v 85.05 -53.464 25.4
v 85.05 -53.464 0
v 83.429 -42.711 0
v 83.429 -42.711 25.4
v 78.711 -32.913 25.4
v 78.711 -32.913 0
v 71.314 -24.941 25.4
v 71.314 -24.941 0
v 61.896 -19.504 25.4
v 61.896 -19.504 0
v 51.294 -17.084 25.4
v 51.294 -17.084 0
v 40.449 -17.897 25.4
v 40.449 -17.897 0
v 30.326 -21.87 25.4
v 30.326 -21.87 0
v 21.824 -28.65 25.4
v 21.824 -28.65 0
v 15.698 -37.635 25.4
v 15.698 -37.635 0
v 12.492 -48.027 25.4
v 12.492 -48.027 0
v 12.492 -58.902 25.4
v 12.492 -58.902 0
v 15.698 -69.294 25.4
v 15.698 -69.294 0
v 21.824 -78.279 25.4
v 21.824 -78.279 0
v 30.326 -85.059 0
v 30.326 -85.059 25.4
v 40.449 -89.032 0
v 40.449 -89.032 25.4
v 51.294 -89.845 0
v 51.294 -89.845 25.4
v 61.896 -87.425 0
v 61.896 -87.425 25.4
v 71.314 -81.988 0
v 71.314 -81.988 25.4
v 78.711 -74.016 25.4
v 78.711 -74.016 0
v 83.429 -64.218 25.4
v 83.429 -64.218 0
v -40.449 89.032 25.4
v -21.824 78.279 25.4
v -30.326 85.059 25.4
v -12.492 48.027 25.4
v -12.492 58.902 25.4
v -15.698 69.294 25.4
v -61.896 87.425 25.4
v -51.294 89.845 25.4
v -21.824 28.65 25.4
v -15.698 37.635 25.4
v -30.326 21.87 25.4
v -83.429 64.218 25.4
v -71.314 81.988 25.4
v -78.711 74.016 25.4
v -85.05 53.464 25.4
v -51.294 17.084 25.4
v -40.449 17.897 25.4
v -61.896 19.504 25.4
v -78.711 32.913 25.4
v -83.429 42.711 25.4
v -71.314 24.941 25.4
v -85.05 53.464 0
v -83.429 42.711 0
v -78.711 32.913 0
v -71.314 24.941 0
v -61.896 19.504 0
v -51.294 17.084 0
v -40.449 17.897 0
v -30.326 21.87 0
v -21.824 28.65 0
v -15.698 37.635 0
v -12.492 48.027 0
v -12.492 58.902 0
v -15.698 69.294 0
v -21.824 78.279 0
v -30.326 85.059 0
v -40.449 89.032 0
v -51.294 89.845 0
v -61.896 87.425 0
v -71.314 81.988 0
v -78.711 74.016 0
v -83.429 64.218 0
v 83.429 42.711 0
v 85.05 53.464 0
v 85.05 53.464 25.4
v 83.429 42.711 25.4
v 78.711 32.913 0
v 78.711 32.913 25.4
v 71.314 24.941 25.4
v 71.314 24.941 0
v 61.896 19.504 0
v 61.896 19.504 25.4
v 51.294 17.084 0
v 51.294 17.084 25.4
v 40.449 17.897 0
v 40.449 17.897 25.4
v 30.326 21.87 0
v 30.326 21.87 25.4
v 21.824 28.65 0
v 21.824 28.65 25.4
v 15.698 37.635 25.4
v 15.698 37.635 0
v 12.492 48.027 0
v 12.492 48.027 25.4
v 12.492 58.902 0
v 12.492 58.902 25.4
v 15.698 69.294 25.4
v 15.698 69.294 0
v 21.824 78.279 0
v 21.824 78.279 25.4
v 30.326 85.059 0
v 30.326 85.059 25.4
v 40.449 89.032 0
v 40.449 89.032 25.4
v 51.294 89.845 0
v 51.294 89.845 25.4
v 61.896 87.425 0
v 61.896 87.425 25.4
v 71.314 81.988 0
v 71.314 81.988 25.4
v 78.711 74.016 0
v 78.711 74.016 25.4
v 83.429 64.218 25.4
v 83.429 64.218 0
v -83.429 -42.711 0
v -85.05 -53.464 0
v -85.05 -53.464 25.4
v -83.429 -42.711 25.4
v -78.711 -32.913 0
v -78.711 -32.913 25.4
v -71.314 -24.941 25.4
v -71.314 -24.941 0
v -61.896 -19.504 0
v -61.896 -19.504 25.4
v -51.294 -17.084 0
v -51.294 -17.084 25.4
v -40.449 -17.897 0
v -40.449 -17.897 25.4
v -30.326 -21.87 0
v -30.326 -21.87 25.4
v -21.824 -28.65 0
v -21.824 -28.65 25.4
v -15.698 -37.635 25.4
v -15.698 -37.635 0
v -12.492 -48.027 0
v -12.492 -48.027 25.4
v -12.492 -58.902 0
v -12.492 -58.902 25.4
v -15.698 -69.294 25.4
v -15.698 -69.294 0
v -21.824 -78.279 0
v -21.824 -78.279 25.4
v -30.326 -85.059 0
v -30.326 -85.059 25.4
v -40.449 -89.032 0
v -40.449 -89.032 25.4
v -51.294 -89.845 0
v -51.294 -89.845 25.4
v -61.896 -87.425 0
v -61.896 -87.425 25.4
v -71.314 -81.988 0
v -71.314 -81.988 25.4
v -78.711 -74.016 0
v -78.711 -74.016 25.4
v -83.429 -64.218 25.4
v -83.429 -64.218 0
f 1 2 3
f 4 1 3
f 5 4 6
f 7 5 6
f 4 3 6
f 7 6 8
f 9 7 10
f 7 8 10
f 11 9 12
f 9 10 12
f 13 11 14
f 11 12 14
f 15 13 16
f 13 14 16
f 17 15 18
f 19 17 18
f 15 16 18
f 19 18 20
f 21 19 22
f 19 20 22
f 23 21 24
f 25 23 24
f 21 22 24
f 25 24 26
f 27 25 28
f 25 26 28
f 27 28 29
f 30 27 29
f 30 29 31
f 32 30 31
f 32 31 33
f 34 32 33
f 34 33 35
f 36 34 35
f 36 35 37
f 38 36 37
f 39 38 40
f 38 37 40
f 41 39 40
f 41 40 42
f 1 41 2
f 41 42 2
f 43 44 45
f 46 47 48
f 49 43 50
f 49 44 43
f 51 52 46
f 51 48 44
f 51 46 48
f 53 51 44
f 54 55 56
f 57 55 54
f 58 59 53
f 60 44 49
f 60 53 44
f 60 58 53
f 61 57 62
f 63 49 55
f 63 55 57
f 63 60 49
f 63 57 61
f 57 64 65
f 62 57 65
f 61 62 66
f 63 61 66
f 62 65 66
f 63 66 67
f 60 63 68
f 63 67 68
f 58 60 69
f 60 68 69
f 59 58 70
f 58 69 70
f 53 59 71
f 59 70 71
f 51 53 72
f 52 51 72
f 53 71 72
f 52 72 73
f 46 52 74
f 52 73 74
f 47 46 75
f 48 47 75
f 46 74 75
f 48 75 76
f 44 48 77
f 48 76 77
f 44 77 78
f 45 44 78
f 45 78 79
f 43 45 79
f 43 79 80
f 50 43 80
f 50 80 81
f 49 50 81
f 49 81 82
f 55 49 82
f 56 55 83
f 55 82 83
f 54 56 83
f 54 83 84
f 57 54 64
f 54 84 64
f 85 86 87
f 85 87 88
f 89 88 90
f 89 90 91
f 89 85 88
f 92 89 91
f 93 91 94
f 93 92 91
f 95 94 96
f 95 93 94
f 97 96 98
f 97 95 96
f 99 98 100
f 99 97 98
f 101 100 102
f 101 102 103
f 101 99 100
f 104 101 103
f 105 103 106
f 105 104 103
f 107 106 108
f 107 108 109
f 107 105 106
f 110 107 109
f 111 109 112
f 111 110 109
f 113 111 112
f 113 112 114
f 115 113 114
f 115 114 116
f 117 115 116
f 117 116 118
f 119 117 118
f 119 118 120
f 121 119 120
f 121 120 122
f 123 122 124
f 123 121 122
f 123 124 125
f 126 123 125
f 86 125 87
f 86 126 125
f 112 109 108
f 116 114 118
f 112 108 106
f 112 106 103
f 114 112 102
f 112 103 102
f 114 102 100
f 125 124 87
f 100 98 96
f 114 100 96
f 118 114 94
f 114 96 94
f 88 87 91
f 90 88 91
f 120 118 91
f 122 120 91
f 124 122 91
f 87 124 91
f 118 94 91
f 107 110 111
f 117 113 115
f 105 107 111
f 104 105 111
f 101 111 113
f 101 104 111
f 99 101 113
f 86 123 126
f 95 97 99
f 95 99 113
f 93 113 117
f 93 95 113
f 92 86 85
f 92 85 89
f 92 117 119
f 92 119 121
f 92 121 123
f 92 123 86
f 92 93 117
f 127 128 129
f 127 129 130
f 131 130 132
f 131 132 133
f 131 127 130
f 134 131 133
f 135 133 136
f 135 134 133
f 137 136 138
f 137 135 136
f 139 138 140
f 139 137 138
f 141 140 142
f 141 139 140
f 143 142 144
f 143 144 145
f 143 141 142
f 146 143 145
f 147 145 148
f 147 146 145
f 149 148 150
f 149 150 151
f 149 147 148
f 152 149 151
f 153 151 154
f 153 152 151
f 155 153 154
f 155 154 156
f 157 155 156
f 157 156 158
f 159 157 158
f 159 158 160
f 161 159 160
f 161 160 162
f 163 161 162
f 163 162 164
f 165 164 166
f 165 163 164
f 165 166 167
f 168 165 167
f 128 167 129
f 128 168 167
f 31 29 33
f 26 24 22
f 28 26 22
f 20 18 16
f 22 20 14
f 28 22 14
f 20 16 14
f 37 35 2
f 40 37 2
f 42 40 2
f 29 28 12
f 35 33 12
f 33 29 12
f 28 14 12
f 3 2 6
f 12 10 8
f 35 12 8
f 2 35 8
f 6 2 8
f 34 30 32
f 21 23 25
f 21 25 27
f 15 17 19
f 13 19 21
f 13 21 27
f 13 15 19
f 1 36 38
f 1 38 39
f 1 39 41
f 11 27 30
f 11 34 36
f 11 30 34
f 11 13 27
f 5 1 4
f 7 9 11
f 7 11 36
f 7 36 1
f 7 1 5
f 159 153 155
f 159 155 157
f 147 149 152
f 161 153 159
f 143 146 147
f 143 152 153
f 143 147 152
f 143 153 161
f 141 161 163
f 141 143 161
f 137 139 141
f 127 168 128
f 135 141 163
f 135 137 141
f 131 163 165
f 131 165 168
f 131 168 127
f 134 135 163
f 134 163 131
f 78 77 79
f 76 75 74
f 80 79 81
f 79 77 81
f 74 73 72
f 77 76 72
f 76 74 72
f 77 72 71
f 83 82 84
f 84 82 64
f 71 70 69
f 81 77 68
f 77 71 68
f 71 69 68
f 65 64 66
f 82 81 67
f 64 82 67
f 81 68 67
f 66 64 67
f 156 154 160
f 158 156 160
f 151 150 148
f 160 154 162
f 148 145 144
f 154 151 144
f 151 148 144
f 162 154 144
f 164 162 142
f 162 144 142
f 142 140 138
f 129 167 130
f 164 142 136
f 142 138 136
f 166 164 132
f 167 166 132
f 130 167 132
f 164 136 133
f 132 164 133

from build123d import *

# Parameters (mm, degrees)
F0_R     = 36.482578
F1_DEPTH = 25.4


with BuildPart() as f1:
    # F0 (on Top) → F1 (new body)
    with BuildSketch(Plane.XY):
        with Locations((48.56728, -53.464413)):
            Circle(F0_R)
    extrude(amount=F1_DEPTH)


with BuildPart() as f2_1:
    # F2: instance of F1
    add(f1.part.mirror(Plane.YZ))


with BuildPart() as f3_1:
    # F3: instance of F1
    add(f1.part.mirror(Plane.XZ))


with BuildPart() as f3_2:
    # F3: instance of F2_1
    add(f2_1.part.mirror(Plane.XZ))


solid = Compound([f1.part, f2_1.part, f3_1.part, f3_2.part])
